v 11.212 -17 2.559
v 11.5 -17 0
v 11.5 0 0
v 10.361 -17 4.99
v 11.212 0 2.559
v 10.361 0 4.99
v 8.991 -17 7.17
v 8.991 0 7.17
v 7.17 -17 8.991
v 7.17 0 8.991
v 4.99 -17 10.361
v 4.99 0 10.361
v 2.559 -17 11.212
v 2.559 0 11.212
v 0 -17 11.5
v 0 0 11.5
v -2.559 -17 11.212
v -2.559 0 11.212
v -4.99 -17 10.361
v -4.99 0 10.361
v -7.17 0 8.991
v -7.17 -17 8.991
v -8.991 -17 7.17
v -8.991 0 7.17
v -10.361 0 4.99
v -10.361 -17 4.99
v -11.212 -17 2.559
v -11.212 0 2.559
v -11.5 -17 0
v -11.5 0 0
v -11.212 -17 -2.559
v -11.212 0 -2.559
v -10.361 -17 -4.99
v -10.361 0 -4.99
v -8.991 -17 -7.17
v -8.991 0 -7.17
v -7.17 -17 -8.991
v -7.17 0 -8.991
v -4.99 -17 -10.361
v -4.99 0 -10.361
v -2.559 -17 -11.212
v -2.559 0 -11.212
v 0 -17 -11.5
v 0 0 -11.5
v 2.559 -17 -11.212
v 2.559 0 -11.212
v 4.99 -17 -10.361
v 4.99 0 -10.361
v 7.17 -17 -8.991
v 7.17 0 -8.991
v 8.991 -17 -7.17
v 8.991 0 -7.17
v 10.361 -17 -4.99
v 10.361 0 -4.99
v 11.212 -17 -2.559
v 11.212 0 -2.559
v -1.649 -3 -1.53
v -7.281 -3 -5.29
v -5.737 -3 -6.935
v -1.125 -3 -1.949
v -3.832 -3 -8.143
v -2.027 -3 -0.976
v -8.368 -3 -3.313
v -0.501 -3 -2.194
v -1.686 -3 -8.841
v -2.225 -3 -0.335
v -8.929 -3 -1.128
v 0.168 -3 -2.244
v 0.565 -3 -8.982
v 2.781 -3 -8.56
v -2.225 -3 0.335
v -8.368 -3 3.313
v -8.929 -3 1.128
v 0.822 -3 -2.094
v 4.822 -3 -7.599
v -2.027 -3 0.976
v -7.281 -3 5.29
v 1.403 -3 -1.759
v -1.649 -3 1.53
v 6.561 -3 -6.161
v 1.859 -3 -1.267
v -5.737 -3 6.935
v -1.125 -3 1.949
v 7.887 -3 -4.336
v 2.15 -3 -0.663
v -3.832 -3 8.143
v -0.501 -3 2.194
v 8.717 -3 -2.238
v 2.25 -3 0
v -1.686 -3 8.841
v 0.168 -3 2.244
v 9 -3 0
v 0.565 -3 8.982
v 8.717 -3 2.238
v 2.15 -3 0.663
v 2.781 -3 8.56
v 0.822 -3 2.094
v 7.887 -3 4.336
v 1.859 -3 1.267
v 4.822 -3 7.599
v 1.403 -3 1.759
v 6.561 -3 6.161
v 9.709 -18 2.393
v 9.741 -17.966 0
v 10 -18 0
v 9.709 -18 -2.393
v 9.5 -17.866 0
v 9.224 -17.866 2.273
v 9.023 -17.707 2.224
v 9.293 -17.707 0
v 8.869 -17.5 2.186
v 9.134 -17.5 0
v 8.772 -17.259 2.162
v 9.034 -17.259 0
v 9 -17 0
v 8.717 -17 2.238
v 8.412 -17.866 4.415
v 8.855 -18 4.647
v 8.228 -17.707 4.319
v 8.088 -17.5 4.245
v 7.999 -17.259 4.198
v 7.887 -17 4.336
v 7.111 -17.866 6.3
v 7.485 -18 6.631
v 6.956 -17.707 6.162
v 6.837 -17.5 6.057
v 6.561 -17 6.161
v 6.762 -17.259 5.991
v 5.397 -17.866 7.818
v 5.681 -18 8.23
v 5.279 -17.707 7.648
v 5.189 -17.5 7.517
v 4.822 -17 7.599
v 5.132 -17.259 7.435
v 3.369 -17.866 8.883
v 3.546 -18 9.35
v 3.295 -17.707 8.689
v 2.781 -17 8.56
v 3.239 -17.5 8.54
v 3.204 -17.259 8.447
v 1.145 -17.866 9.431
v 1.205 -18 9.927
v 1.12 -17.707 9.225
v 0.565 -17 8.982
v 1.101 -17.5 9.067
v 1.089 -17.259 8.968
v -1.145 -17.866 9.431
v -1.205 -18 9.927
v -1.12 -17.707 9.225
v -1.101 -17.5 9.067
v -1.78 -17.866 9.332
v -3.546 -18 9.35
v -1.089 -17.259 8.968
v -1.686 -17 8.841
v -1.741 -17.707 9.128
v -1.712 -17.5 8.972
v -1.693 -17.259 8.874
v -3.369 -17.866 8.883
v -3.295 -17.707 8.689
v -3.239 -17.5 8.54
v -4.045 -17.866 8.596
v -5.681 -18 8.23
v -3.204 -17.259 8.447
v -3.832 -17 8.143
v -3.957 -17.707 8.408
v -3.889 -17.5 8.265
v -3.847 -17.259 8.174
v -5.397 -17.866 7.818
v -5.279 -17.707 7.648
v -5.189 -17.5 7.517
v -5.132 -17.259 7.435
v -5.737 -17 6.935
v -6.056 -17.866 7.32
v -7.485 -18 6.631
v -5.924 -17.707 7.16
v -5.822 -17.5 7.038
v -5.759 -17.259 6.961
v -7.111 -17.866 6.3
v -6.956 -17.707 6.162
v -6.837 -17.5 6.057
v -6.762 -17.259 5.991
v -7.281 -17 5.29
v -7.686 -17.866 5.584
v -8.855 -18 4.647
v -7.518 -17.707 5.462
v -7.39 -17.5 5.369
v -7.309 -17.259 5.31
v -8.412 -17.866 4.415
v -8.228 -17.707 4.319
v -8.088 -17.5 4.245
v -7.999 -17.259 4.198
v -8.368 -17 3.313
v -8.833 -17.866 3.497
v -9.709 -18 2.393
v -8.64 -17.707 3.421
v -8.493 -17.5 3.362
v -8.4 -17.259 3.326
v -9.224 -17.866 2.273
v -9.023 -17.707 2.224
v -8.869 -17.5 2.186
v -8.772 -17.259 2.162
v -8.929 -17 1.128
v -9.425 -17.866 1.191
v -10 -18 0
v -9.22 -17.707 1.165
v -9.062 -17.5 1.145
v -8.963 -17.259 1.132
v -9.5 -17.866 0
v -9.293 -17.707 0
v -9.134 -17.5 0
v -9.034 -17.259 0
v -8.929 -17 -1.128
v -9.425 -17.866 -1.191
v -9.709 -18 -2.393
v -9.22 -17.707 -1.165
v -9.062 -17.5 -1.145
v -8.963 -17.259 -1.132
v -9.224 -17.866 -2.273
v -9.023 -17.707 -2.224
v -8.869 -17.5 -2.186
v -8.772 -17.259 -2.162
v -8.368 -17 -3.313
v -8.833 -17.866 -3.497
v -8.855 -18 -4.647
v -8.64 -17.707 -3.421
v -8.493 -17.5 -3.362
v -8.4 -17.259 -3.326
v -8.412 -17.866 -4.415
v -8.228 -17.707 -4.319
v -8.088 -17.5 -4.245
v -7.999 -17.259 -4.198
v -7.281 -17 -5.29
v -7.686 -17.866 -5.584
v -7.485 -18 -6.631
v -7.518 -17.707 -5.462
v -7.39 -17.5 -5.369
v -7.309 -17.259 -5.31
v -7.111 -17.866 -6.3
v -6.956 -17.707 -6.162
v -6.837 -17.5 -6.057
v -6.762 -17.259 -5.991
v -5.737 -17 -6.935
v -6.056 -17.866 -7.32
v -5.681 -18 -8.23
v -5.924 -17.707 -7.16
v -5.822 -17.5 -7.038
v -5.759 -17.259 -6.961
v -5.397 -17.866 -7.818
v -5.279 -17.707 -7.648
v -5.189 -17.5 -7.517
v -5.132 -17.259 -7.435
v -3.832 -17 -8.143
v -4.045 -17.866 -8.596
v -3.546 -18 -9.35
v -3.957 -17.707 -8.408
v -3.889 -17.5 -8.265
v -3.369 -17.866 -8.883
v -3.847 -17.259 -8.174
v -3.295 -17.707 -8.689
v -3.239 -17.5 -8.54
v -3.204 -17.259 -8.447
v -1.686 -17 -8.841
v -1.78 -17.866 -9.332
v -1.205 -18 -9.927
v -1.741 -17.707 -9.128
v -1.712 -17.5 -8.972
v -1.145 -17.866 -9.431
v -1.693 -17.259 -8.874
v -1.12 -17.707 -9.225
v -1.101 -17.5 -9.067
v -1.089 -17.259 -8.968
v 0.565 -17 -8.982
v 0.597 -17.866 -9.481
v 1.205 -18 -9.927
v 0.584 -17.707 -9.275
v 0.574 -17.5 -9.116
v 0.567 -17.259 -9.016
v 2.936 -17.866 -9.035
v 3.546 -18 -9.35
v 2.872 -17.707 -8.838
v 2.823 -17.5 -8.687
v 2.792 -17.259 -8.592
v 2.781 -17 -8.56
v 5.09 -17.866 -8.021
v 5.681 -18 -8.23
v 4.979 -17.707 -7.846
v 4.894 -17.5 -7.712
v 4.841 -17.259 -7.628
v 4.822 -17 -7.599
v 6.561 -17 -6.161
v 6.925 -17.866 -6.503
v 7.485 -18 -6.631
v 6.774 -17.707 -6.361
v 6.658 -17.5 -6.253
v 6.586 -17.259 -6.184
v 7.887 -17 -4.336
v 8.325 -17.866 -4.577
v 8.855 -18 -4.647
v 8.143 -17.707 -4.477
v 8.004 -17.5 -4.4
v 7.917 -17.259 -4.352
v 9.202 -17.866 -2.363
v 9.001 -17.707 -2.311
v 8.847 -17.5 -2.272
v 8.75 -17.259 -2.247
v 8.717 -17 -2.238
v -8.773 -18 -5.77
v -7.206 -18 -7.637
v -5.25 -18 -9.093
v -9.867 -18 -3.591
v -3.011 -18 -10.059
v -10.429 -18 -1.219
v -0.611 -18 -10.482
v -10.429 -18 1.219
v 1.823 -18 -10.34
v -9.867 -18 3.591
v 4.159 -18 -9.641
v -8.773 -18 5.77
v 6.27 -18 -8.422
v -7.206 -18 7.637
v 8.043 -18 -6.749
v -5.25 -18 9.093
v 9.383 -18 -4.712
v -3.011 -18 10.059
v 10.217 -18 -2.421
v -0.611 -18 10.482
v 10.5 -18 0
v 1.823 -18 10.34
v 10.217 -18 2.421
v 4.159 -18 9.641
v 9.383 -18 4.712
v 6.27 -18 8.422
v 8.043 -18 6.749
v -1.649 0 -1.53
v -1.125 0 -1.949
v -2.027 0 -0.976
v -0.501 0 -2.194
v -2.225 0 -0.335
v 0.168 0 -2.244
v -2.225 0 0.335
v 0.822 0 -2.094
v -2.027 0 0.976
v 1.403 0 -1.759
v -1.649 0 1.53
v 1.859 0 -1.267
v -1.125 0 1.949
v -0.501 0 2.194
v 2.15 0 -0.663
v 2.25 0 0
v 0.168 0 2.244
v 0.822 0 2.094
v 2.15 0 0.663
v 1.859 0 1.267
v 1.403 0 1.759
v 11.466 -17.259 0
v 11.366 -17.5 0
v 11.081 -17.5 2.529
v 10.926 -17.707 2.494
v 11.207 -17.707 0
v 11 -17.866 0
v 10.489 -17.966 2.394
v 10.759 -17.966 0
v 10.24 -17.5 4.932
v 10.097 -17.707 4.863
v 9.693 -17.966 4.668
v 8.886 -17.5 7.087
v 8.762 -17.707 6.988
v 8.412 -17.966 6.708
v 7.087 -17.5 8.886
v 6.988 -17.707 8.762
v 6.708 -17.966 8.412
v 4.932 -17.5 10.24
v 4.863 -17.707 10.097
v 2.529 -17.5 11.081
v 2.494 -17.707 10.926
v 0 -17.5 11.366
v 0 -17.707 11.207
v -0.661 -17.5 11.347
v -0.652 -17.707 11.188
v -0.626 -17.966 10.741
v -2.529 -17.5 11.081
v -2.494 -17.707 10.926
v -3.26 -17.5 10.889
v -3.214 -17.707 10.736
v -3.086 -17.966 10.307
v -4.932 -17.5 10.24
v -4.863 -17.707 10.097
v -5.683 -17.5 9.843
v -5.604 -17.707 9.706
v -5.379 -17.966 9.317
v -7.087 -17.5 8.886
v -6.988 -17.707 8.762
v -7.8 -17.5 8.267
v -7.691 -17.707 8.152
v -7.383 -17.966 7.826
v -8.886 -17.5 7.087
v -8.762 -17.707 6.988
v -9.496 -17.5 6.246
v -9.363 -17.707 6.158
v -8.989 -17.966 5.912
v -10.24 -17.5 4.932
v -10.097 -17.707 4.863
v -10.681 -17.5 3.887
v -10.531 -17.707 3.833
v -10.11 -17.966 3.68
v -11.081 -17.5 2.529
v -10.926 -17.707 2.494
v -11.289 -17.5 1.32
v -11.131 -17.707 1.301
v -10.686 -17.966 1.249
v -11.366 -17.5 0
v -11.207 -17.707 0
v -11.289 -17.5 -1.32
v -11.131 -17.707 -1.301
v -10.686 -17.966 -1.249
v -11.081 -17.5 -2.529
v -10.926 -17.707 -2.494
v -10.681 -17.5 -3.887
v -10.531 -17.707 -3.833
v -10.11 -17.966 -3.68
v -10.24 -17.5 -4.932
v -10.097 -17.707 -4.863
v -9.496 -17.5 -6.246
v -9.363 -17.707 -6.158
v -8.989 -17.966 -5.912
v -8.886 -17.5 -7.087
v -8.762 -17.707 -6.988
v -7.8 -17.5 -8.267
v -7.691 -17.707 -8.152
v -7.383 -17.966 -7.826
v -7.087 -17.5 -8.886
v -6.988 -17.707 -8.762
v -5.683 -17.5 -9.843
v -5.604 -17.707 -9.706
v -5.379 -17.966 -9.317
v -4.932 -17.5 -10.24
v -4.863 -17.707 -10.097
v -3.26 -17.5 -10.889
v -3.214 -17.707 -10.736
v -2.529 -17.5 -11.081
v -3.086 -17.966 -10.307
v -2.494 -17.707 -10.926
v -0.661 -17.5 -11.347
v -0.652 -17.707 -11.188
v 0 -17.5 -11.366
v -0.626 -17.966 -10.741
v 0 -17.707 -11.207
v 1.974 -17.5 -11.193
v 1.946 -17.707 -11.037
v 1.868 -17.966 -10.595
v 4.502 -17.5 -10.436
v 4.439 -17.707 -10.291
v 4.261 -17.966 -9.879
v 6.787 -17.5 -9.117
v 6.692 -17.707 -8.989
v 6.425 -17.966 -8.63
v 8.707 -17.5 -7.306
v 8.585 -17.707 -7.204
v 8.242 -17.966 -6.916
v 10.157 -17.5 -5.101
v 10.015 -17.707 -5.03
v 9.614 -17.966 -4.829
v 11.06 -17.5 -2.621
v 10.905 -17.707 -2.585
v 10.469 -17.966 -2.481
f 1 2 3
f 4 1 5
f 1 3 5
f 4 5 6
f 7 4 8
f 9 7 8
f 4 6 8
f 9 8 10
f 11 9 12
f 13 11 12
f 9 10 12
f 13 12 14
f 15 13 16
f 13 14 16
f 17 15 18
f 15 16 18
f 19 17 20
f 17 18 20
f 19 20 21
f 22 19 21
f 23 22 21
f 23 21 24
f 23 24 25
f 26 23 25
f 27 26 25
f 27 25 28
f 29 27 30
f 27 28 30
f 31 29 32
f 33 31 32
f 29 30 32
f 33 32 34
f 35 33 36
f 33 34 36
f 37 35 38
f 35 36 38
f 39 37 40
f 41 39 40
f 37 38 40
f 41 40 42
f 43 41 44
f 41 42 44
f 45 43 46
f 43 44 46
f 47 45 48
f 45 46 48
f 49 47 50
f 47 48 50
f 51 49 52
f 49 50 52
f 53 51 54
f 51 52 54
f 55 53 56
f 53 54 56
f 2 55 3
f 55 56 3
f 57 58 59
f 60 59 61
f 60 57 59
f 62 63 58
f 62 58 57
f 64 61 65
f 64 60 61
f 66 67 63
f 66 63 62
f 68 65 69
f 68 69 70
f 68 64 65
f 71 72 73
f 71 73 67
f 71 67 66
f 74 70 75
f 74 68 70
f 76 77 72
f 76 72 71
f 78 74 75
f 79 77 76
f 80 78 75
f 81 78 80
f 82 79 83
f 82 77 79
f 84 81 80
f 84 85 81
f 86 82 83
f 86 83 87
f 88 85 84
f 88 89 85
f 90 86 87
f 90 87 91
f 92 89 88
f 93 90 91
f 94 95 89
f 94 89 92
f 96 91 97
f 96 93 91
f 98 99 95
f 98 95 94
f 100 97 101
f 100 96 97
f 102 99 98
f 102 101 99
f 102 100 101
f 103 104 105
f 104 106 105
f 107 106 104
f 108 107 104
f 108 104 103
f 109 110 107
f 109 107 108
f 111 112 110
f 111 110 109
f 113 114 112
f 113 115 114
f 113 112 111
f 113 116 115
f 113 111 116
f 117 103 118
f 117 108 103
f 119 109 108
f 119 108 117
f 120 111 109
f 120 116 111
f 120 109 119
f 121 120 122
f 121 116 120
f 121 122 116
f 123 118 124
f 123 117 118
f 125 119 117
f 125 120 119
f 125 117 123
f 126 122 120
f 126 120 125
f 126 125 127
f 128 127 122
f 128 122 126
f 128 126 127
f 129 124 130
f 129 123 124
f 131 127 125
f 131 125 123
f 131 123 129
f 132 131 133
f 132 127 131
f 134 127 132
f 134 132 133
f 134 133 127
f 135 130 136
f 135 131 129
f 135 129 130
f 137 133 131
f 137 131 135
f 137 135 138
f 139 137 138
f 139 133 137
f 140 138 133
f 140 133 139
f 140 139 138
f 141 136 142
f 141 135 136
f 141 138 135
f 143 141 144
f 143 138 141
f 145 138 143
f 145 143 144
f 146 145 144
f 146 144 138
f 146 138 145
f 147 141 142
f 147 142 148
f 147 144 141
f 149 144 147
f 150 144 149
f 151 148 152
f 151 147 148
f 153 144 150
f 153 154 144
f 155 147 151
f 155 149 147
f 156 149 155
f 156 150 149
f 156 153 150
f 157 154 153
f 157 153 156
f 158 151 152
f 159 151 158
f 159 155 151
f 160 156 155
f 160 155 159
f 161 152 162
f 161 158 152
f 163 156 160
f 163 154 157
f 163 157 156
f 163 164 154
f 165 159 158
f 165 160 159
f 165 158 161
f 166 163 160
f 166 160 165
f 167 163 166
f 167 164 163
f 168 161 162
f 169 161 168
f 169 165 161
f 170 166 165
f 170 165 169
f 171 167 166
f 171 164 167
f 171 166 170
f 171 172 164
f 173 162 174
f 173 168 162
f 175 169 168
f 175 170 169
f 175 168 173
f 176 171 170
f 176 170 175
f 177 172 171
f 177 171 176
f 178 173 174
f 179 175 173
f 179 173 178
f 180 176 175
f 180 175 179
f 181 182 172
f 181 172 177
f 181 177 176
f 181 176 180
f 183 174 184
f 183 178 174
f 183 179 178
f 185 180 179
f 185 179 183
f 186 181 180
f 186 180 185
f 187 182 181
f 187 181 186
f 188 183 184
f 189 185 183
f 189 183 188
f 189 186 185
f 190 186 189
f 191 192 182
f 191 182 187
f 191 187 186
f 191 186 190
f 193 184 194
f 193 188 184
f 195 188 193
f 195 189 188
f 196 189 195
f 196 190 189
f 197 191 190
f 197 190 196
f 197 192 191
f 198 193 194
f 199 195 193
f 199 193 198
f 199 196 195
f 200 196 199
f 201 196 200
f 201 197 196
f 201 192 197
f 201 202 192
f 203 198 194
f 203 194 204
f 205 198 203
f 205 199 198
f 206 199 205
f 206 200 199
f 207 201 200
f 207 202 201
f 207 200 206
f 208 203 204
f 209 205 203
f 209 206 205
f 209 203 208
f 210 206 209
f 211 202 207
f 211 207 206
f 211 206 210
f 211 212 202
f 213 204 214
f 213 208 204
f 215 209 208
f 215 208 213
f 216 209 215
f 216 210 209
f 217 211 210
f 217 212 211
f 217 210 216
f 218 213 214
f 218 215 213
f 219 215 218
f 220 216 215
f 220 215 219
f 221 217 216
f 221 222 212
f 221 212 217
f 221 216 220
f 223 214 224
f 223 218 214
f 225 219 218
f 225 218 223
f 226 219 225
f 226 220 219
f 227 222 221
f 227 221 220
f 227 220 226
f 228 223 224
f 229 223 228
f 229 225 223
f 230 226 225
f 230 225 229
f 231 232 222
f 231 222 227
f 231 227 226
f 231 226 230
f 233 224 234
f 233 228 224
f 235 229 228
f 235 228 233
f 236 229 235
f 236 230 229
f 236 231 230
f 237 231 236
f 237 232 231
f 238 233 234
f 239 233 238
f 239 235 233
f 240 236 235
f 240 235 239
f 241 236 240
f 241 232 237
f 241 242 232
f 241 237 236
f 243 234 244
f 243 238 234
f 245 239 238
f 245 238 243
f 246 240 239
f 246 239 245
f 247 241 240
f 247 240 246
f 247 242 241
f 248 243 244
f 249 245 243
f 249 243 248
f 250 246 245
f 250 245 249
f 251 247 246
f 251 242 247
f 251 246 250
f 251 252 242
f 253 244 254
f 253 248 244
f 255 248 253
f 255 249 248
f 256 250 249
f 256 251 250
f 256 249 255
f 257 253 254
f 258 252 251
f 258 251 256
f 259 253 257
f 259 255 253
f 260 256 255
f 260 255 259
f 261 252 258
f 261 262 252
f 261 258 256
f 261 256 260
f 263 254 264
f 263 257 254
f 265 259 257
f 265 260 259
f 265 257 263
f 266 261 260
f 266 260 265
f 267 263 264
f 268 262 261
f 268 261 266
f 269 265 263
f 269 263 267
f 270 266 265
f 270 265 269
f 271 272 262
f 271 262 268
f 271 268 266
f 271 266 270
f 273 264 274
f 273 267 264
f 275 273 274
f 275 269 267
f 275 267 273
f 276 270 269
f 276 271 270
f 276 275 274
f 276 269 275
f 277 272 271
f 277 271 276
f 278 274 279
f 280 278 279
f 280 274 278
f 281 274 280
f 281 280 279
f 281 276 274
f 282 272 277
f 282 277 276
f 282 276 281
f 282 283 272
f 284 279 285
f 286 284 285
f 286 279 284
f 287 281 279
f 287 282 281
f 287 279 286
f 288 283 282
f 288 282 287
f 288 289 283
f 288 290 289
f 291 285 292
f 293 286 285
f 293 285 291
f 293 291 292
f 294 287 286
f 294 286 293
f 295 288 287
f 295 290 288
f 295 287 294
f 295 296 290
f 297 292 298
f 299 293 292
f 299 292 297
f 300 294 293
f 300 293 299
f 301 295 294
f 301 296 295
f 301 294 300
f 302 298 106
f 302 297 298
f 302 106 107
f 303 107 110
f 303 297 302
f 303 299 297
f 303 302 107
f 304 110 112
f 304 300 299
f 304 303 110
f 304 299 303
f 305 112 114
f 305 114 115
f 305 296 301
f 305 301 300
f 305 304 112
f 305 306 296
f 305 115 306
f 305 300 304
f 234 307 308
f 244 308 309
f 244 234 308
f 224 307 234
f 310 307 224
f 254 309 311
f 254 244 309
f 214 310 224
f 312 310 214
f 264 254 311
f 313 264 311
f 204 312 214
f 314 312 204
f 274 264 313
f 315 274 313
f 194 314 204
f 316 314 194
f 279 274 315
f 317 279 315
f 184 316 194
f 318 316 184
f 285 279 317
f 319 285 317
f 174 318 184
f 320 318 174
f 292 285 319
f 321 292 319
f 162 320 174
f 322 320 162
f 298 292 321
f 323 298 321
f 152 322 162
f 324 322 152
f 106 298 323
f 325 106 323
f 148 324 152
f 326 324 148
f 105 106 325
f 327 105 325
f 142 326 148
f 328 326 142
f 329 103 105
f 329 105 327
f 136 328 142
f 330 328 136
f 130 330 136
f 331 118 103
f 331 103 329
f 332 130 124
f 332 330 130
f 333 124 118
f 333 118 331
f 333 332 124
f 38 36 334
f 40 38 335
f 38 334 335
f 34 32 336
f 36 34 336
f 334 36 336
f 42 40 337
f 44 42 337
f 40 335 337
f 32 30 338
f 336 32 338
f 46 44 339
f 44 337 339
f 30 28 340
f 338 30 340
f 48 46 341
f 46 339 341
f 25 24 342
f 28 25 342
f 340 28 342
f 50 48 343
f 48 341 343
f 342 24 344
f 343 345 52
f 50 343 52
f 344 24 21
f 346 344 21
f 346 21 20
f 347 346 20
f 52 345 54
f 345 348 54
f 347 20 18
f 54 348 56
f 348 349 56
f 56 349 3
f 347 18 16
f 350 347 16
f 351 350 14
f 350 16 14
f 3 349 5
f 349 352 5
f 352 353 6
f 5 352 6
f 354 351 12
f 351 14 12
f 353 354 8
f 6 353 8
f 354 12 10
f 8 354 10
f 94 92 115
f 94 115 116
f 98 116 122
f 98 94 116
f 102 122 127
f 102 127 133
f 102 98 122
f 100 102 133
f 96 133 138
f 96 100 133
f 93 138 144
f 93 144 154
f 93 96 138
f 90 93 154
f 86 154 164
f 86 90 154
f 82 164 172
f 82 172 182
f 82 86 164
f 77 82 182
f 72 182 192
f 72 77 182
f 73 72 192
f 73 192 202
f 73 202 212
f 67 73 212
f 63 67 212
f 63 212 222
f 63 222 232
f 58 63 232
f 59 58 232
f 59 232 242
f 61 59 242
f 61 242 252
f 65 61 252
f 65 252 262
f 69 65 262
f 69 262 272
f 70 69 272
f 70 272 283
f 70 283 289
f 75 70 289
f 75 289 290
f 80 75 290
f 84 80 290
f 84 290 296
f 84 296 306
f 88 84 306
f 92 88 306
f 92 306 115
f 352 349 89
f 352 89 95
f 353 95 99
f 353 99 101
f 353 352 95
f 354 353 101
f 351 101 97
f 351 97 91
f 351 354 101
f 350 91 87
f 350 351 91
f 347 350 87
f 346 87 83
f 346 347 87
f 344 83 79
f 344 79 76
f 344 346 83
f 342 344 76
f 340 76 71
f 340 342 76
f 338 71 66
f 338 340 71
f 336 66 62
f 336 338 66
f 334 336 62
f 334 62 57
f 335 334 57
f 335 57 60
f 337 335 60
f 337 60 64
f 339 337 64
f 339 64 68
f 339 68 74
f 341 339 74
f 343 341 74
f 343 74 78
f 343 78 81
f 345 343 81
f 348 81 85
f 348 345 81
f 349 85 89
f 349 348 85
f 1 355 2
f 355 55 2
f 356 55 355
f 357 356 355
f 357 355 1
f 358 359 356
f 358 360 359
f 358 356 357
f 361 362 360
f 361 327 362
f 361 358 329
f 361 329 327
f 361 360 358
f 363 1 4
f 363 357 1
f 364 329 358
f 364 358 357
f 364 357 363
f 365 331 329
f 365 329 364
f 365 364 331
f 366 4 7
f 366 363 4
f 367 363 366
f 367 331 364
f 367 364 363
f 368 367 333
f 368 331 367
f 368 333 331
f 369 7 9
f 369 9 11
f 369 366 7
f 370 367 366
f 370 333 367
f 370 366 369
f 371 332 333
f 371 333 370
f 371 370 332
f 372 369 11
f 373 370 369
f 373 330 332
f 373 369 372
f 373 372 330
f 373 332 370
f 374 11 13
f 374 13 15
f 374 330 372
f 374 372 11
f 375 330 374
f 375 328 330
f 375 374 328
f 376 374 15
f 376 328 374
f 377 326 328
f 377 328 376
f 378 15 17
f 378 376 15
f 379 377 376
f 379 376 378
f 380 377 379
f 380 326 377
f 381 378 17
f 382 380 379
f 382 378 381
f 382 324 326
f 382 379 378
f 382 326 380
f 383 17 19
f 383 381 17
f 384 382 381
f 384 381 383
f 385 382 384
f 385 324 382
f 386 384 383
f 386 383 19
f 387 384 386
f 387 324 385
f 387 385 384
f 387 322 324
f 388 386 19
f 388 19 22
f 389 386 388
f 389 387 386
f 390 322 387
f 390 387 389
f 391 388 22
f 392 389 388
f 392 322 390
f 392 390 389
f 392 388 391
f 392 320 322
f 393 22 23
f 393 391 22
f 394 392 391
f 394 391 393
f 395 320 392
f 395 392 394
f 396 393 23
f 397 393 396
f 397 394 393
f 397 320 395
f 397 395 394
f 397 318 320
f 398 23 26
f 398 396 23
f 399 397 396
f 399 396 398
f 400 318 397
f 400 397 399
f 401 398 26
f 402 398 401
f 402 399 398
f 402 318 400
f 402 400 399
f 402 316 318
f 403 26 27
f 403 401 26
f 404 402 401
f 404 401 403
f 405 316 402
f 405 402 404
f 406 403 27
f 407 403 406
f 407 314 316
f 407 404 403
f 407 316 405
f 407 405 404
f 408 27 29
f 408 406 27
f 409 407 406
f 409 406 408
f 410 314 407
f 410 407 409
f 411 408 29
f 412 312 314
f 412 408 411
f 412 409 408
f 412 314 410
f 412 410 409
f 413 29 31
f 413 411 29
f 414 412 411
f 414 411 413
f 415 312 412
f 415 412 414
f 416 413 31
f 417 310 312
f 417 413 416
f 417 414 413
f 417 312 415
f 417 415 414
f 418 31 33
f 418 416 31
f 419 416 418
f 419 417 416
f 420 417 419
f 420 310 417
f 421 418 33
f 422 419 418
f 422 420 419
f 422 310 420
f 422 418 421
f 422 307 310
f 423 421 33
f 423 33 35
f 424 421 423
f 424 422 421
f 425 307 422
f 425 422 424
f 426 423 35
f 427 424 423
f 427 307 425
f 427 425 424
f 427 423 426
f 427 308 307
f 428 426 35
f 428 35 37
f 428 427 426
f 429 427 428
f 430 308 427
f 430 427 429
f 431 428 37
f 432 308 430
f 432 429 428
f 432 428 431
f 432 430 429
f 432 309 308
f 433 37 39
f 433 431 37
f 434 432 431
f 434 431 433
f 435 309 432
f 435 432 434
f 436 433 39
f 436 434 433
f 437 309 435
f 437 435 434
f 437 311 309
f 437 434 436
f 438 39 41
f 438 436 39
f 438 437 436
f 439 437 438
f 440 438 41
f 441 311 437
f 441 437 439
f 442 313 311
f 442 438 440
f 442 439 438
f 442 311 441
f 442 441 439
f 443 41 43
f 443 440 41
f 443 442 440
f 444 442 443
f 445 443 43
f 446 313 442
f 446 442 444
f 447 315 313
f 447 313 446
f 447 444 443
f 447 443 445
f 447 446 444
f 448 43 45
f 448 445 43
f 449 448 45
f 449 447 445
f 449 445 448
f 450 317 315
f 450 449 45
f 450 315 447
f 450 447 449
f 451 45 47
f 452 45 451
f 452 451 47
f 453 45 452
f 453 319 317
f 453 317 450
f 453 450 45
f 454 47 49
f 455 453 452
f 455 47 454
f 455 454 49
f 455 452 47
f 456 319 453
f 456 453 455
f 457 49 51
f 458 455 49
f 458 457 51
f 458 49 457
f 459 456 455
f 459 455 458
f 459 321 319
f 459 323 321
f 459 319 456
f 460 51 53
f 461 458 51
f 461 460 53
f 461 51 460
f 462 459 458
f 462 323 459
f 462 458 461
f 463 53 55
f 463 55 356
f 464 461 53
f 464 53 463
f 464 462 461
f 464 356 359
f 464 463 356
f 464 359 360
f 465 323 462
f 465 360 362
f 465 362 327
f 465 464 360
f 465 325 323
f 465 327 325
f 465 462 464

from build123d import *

# Parameters (mm, degrees)
F0_R     = 9
F0_R_2   = 2.25
F1_DEPTH = 3
F0_R_3   = 11.5
F2_DEPTH = 18
F3_R     = 1


with BuildPart() as f1:
    # F0 (on Front) → F1 (new body)
    with BuildSketch(Plane.XZ):
        Circle(F0_R)
        Circle(F0_R_2, mode=Mode.SUBTRACT)
    extrude(amount=F1_DEPTH)

    # F0 (on Front) → F2 (join)
    with BuildSketch(Plane.XZ):
        Circle(F0_R_3)
        Circle(F0_R, mode=Mode.SUBTRACT)
    extrude(amount=F2_DEPTH)

    # F3
    f3_edges = [f1.edges().sort_by_distance(p)[0] for p in [
        (-9, -18, 0),
        (-11.5, -18, 0),
    ]]
    fillet(f3_edges, radius=F3_R)


solid = f1.part
